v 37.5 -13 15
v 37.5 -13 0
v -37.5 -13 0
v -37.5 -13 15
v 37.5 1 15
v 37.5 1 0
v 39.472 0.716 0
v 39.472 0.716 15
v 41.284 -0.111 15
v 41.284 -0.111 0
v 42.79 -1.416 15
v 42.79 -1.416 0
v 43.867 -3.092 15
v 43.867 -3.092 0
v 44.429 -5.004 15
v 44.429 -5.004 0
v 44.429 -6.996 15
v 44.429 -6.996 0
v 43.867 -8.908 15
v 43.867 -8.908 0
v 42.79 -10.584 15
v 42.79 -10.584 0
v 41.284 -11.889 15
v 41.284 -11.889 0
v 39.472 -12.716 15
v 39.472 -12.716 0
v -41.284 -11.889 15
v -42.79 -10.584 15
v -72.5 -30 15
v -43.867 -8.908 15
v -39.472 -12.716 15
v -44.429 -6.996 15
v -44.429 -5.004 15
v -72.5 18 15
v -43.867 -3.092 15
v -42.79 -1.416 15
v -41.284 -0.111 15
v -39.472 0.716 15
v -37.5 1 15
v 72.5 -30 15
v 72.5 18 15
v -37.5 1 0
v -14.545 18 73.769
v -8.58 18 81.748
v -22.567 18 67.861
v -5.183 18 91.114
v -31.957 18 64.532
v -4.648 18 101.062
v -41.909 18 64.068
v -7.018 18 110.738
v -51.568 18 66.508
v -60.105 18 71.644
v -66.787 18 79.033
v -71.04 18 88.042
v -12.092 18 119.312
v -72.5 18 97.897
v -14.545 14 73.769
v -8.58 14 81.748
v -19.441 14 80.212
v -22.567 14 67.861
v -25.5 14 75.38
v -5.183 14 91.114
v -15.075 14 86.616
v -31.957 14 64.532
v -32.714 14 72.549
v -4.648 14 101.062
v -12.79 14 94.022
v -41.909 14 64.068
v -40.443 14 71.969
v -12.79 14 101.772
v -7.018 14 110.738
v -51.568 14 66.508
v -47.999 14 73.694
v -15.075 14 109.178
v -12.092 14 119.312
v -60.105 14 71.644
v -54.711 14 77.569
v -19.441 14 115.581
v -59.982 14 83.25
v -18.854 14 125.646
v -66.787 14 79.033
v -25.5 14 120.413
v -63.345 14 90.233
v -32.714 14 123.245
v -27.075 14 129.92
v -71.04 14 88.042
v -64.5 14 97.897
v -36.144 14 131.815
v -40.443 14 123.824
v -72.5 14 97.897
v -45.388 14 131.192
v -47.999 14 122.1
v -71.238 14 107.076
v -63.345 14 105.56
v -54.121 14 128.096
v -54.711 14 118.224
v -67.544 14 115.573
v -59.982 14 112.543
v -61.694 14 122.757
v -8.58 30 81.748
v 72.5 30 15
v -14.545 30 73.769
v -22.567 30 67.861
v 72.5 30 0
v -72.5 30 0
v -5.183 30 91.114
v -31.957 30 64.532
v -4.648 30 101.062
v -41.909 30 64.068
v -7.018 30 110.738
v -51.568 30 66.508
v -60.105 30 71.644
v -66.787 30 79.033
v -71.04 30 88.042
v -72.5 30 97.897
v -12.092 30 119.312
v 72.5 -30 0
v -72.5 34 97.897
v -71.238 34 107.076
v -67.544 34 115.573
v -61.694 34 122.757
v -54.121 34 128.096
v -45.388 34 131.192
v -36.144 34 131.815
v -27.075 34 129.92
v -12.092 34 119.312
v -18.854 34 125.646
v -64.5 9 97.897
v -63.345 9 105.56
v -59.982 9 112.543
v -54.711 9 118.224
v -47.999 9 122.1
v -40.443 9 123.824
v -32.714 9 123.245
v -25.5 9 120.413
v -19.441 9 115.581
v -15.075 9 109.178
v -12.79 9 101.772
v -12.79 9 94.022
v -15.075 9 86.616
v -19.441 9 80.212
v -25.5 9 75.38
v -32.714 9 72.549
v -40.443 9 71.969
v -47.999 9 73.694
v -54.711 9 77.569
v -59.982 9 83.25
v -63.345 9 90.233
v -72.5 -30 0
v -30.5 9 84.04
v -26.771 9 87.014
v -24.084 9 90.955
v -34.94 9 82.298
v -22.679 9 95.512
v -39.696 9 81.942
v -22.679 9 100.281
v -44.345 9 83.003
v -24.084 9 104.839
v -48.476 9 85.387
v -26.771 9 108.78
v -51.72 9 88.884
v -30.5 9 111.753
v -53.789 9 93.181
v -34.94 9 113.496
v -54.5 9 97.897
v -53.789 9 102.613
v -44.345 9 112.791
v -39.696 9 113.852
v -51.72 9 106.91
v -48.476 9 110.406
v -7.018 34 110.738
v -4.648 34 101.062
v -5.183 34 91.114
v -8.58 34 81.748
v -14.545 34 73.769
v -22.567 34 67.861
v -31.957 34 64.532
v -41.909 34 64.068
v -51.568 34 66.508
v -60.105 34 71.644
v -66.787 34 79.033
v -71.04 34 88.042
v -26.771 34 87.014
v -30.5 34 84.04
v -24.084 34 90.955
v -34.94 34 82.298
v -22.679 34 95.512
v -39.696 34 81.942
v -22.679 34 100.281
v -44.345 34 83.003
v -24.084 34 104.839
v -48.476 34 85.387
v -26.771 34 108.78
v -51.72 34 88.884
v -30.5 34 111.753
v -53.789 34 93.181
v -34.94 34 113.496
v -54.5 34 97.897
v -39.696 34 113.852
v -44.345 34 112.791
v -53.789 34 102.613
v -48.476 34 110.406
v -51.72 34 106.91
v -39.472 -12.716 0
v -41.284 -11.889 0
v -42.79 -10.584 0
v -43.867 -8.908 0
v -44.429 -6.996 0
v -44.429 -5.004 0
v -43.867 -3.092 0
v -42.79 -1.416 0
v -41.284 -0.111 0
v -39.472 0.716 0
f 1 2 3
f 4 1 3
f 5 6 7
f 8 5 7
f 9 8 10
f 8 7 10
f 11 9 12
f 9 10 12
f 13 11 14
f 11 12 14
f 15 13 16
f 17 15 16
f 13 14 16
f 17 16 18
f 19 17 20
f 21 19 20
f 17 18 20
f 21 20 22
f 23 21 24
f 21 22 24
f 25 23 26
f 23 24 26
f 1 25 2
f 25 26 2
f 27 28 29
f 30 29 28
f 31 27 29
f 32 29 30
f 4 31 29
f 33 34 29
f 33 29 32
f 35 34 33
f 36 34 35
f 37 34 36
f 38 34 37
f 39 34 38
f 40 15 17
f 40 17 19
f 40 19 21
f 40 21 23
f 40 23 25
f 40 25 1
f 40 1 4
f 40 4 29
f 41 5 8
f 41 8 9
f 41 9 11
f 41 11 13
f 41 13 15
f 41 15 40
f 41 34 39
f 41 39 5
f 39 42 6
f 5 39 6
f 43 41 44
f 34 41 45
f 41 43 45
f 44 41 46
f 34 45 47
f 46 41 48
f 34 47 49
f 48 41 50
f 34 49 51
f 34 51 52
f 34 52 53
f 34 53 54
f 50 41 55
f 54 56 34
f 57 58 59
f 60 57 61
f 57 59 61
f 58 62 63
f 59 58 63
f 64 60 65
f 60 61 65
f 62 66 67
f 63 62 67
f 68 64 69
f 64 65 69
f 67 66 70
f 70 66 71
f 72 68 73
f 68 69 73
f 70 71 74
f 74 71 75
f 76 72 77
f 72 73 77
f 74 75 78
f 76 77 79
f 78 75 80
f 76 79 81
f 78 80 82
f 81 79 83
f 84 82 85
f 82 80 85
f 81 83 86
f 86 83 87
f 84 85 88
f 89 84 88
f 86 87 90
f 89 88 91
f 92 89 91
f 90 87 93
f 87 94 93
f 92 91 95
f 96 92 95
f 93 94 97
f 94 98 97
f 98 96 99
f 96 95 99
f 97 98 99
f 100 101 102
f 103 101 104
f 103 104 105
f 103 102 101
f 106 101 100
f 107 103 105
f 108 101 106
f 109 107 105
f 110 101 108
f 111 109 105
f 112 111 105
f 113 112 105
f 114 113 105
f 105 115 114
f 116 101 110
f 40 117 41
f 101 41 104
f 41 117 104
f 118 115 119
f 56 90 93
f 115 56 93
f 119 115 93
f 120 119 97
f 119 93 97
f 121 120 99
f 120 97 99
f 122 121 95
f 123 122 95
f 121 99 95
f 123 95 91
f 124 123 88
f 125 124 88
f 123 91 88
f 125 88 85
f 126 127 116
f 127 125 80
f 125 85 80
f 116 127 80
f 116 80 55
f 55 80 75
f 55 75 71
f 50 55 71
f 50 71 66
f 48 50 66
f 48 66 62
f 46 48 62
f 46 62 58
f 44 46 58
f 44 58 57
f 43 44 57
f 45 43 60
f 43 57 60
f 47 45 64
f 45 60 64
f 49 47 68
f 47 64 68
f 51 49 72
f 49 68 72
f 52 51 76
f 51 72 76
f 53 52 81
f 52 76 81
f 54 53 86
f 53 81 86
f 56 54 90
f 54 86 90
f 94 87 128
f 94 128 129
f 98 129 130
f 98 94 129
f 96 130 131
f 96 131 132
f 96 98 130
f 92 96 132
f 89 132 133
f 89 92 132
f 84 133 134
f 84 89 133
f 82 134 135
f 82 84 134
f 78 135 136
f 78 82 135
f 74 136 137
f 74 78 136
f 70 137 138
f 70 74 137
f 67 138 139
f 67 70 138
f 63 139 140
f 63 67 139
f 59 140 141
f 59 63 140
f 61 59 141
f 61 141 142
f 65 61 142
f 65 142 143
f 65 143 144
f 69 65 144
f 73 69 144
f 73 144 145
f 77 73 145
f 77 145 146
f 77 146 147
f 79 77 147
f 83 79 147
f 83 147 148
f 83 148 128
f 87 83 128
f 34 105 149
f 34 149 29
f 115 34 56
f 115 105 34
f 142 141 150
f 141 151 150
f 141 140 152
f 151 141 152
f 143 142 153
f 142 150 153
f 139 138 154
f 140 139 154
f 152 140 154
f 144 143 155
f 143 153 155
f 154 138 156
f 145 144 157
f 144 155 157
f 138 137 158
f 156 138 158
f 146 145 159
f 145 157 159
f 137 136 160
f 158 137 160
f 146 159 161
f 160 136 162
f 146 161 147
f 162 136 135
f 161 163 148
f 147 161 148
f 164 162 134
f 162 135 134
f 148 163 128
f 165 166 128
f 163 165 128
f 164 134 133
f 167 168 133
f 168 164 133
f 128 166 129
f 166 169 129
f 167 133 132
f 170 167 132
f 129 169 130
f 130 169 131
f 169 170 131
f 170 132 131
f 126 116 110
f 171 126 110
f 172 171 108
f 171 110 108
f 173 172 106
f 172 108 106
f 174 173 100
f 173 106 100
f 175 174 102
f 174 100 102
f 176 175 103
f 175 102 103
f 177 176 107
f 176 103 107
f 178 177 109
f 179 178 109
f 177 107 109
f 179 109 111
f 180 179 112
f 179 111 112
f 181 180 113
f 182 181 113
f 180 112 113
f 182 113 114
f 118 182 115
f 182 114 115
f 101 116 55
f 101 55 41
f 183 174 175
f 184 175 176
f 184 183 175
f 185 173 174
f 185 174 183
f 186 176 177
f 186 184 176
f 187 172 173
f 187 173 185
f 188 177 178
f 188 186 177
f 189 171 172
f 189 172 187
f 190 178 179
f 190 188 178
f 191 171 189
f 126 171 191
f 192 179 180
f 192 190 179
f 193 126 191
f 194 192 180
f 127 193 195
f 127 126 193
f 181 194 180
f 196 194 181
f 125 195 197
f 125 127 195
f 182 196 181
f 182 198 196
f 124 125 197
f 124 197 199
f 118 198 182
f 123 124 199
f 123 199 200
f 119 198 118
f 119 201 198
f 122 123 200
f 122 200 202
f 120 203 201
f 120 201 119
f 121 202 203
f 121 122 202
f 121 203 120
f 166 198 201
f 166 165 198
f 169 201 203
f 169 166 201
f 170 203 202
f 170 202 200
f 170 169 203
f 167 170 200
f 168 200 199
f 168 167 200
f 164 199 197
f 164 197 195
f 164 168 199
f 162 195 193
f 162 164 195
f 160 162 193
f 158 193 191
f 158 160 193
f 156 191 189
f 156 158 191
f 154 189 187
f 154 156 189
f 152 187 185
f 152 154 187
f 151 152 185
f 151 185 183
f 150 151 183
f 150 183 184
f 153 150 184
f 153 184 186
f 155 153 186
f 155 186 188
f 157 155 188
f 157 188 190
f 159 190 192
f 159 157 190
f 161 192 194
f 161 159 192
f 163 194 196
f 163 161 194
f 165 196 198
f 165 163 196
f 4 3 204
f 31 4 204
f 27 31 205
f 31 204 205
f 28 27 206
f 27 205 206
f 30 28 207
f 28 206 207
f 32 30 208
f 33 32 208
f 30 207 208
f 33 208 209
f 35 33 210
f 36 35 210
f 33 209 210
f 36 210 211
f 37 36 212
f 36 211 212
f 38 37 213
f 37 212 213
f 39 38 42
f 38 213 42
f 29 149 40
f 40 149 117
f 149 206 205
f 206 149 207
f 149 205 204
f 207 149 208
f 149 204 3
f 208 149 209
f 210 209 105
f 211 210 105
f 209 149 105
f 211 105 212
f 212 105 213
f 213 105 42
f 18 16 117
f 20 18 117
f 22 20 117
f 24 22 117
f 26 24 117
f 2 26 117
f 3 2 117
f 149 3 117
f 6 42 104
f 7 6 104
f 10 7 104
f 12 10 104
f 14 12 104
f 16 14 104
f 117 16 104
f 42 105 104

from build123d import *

# Parameters (mm, degrees)
F0_W     = 145
F0_H     = 60
F1_DEPTH = 15
F4_DEPTH = 12
F3_R     = 26
F5_DEPTH = 16
F3_R_2   = 16
F6_DEPTH = 21
F7_DEPTH = 4
F8_DEPTH = 4


with BuildPart() as f1:
    # F0 (on Top) → F1 (new body)
    with BuildSketch(Plane.XY):
        Rectangle(F0_W, F0_H)
        with BuildLine():
            ThreePointArc((37.5, 1), (44.5, -6), (37.5, -13))
            Line((37.5, -13), (-37.5, -13))
            ThreePointArc((-37.5, -13), (-44.5, -6), (-37.5, 1))
            Line((-37.5, 1), (37.5, 1))
        make_face(mode=Mode.SUBTRACT)
    extrude(amount=F1_DEPTH)

    # F3 (on offset) → F4 (join)
    with BuildSketch(Plane(origin=(0, 30, 0), x_dir=(-1, 0, 0), z_dir=(0, 1, 0))):
        with BuildLine():
            Line((12.092110391, 119.3122868922), (-72.5, 15))
            Line((-72.5, 15), (72.5, 15))
            Line((72.5, 15), (72.5, 97.8967932859))
            ThreePointArc((72.5, 97.8967932859), (27.1392836208, 65.8509804026), (12.092110391, 119.3122868922))
        make_face()
    extrude(amount=-F4_DEPTH)

    # F3 (on offset) → F5 (join)
    with BuildSketch(Plane(origin=(0, 30, 0), x_dir=(-1, 0, 0), z_dir=(0, 1, 0))):
        with BuildLine():
            ThreePointArc((72.5, 97.8967932859), (49.8607163792, 129.9426061692), (12.092110391, 119.3122868922))
            ThreePointArc((12.092110391, 119.3122868922), (27.1392836208, 65.8509804026), (72.5, 97.8967932859))
        make_face()
        with Locations((38.5, 97.8967932859)):
            Circle(F3_R, mode=Mode.SUBTRACT)
    extrude(amount=-F5_DEPTH)

    # F3 (on offset) → F6 (join)
    with BuildSketch(Plane(origin=(0, 30, 0), x_dir=(-1, 0, 0), z_dir=(0, 1, 0))):
        with Locations((38.5, 97.8967932859)):
            Circle(F3_R)
        with Locations((38.5, 97.8967932859)):
            Circle(F3_R_2, mode=Mode.SUBTRACT)
    extrude(amount=-F6_DEPTH)

    # F3 (on offset) → F7 (join)
    with BuildSketch(Plane(origin=(0, 30, 0), x_dir=(-1, 0, 0), z_dir=(0, 1, 0))):
        with BuildLine():
            ThreePointArc((72.5, 97.8967932859), (49.8607163792, 129.9426061692), (12.092110391, 119.3122868922))
            ThreePointArc((12.092110391, 119.3122868922), (27.1392836208, 65.8509804026), (72.5, 97.8967932859))
        make_face()
        with Locations((38.5, 97.8967932859)):
            Circle(F3_R, mode=Mode.SUBTRACT)
    extrude(amount=F7_DEPTH)

    # F3 (on offset) → F8 (join)
    with BuildSketch(Plane(origin=(0, 30, 0), x_dir=(-1, 0, 0), z_dir=(0, 1, 0))):
        with Locations((38.5, 97.8967932859)):
            Circle(F3_R)
        with Locations((38.5, 97.8967932859)):
            Circle(F3_R_2, mode=Mode.SUBTRACT)
    extrude(amount=F8_DEPTH)


solid = f1.part
